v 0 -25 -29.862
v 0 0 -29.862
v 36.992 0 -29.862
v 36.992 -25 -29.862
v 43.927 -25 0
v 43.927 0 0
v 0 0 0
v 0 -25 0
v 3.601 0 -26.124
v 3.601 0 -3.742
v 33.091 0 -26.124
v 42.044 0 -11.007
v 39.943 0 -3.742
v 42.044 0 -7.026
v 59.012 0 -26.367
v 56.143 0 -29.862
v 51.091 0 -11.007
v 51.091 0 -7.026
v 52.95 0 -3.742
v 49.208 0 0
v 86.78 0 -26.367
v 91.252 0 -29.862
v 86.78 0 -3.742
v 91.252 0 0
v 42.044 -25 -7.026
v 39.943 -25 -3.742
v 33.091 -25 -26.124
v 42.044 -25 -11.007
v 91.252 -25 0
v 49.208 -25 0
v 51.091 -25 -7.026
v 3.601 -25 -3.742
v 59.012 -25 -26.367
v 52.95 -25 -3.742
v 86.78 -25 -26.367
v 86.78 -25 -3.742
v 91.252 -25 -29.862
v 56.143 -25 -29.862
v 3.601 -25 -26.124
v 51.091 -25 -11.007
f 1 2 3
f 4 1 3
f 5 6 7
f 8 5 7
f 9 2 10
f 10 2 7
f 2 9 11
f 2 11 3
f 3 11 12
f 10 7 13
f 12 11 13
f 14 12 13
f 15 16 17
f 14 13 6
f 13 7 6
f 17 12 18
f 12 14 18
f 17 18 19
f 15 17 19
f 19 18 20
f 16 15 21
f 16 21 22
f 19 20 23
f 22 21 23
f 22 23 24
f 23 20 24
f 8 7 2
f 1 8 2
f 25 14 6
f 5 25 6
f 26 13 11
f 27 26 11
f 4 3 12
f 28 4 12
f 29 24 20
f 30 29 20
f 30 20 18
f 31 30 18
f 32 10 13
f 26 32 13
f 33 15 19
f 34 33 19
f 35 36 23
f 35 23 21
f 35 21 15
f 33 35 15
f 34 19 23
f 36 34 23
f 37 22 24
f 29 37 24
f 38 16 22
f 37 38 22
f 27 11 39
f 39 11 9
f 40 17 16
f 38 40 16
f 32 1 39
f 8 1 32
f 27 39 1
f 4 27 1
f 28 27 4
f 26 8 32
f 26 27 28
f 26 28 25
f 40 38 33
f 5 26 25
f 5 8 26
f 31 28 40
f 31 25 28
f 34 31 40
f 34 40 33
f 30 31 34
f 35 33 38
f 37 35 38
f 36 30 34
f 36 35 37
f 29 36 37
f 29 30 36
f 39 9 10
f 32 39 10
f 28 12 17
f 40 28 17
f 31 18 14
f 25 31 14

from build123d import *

# Parameters (mm, degrees)
F1_DEPTH = 25


with BuildPart() as f1:
    # F0 (on Front) → F1 (new body)
    with BuildSketch(Plane.XZ):
        Polygon((42.044164, -7.025787), (43.926718, 0), (0, 0), (0, -29.861876), (36.991882, -29.861876), (42.044164, -11.006502), (51.090819, -11.006502), (56.143101, -29.861876), (91.252429, -29.861876), (91.252429, 0), (49.208265, 0), (51.090819, -7.025787), align=None)
        Polygon((3.600854, -26.124269), (3.600854, -3.742162), (39.94265, -3.742162), (33.090983, -26.124269), align=None, mode=Mode.SUBTRACT)
        Polygon((52.949521, -3.742162), (86.779835, -3.742162), (86.779835, -26.366743), (59.011759, -26.366743), align=None, mode=Mode.SUBTRACT)
    extrude(amount=F1_DEPTH)


solid = f1.part
